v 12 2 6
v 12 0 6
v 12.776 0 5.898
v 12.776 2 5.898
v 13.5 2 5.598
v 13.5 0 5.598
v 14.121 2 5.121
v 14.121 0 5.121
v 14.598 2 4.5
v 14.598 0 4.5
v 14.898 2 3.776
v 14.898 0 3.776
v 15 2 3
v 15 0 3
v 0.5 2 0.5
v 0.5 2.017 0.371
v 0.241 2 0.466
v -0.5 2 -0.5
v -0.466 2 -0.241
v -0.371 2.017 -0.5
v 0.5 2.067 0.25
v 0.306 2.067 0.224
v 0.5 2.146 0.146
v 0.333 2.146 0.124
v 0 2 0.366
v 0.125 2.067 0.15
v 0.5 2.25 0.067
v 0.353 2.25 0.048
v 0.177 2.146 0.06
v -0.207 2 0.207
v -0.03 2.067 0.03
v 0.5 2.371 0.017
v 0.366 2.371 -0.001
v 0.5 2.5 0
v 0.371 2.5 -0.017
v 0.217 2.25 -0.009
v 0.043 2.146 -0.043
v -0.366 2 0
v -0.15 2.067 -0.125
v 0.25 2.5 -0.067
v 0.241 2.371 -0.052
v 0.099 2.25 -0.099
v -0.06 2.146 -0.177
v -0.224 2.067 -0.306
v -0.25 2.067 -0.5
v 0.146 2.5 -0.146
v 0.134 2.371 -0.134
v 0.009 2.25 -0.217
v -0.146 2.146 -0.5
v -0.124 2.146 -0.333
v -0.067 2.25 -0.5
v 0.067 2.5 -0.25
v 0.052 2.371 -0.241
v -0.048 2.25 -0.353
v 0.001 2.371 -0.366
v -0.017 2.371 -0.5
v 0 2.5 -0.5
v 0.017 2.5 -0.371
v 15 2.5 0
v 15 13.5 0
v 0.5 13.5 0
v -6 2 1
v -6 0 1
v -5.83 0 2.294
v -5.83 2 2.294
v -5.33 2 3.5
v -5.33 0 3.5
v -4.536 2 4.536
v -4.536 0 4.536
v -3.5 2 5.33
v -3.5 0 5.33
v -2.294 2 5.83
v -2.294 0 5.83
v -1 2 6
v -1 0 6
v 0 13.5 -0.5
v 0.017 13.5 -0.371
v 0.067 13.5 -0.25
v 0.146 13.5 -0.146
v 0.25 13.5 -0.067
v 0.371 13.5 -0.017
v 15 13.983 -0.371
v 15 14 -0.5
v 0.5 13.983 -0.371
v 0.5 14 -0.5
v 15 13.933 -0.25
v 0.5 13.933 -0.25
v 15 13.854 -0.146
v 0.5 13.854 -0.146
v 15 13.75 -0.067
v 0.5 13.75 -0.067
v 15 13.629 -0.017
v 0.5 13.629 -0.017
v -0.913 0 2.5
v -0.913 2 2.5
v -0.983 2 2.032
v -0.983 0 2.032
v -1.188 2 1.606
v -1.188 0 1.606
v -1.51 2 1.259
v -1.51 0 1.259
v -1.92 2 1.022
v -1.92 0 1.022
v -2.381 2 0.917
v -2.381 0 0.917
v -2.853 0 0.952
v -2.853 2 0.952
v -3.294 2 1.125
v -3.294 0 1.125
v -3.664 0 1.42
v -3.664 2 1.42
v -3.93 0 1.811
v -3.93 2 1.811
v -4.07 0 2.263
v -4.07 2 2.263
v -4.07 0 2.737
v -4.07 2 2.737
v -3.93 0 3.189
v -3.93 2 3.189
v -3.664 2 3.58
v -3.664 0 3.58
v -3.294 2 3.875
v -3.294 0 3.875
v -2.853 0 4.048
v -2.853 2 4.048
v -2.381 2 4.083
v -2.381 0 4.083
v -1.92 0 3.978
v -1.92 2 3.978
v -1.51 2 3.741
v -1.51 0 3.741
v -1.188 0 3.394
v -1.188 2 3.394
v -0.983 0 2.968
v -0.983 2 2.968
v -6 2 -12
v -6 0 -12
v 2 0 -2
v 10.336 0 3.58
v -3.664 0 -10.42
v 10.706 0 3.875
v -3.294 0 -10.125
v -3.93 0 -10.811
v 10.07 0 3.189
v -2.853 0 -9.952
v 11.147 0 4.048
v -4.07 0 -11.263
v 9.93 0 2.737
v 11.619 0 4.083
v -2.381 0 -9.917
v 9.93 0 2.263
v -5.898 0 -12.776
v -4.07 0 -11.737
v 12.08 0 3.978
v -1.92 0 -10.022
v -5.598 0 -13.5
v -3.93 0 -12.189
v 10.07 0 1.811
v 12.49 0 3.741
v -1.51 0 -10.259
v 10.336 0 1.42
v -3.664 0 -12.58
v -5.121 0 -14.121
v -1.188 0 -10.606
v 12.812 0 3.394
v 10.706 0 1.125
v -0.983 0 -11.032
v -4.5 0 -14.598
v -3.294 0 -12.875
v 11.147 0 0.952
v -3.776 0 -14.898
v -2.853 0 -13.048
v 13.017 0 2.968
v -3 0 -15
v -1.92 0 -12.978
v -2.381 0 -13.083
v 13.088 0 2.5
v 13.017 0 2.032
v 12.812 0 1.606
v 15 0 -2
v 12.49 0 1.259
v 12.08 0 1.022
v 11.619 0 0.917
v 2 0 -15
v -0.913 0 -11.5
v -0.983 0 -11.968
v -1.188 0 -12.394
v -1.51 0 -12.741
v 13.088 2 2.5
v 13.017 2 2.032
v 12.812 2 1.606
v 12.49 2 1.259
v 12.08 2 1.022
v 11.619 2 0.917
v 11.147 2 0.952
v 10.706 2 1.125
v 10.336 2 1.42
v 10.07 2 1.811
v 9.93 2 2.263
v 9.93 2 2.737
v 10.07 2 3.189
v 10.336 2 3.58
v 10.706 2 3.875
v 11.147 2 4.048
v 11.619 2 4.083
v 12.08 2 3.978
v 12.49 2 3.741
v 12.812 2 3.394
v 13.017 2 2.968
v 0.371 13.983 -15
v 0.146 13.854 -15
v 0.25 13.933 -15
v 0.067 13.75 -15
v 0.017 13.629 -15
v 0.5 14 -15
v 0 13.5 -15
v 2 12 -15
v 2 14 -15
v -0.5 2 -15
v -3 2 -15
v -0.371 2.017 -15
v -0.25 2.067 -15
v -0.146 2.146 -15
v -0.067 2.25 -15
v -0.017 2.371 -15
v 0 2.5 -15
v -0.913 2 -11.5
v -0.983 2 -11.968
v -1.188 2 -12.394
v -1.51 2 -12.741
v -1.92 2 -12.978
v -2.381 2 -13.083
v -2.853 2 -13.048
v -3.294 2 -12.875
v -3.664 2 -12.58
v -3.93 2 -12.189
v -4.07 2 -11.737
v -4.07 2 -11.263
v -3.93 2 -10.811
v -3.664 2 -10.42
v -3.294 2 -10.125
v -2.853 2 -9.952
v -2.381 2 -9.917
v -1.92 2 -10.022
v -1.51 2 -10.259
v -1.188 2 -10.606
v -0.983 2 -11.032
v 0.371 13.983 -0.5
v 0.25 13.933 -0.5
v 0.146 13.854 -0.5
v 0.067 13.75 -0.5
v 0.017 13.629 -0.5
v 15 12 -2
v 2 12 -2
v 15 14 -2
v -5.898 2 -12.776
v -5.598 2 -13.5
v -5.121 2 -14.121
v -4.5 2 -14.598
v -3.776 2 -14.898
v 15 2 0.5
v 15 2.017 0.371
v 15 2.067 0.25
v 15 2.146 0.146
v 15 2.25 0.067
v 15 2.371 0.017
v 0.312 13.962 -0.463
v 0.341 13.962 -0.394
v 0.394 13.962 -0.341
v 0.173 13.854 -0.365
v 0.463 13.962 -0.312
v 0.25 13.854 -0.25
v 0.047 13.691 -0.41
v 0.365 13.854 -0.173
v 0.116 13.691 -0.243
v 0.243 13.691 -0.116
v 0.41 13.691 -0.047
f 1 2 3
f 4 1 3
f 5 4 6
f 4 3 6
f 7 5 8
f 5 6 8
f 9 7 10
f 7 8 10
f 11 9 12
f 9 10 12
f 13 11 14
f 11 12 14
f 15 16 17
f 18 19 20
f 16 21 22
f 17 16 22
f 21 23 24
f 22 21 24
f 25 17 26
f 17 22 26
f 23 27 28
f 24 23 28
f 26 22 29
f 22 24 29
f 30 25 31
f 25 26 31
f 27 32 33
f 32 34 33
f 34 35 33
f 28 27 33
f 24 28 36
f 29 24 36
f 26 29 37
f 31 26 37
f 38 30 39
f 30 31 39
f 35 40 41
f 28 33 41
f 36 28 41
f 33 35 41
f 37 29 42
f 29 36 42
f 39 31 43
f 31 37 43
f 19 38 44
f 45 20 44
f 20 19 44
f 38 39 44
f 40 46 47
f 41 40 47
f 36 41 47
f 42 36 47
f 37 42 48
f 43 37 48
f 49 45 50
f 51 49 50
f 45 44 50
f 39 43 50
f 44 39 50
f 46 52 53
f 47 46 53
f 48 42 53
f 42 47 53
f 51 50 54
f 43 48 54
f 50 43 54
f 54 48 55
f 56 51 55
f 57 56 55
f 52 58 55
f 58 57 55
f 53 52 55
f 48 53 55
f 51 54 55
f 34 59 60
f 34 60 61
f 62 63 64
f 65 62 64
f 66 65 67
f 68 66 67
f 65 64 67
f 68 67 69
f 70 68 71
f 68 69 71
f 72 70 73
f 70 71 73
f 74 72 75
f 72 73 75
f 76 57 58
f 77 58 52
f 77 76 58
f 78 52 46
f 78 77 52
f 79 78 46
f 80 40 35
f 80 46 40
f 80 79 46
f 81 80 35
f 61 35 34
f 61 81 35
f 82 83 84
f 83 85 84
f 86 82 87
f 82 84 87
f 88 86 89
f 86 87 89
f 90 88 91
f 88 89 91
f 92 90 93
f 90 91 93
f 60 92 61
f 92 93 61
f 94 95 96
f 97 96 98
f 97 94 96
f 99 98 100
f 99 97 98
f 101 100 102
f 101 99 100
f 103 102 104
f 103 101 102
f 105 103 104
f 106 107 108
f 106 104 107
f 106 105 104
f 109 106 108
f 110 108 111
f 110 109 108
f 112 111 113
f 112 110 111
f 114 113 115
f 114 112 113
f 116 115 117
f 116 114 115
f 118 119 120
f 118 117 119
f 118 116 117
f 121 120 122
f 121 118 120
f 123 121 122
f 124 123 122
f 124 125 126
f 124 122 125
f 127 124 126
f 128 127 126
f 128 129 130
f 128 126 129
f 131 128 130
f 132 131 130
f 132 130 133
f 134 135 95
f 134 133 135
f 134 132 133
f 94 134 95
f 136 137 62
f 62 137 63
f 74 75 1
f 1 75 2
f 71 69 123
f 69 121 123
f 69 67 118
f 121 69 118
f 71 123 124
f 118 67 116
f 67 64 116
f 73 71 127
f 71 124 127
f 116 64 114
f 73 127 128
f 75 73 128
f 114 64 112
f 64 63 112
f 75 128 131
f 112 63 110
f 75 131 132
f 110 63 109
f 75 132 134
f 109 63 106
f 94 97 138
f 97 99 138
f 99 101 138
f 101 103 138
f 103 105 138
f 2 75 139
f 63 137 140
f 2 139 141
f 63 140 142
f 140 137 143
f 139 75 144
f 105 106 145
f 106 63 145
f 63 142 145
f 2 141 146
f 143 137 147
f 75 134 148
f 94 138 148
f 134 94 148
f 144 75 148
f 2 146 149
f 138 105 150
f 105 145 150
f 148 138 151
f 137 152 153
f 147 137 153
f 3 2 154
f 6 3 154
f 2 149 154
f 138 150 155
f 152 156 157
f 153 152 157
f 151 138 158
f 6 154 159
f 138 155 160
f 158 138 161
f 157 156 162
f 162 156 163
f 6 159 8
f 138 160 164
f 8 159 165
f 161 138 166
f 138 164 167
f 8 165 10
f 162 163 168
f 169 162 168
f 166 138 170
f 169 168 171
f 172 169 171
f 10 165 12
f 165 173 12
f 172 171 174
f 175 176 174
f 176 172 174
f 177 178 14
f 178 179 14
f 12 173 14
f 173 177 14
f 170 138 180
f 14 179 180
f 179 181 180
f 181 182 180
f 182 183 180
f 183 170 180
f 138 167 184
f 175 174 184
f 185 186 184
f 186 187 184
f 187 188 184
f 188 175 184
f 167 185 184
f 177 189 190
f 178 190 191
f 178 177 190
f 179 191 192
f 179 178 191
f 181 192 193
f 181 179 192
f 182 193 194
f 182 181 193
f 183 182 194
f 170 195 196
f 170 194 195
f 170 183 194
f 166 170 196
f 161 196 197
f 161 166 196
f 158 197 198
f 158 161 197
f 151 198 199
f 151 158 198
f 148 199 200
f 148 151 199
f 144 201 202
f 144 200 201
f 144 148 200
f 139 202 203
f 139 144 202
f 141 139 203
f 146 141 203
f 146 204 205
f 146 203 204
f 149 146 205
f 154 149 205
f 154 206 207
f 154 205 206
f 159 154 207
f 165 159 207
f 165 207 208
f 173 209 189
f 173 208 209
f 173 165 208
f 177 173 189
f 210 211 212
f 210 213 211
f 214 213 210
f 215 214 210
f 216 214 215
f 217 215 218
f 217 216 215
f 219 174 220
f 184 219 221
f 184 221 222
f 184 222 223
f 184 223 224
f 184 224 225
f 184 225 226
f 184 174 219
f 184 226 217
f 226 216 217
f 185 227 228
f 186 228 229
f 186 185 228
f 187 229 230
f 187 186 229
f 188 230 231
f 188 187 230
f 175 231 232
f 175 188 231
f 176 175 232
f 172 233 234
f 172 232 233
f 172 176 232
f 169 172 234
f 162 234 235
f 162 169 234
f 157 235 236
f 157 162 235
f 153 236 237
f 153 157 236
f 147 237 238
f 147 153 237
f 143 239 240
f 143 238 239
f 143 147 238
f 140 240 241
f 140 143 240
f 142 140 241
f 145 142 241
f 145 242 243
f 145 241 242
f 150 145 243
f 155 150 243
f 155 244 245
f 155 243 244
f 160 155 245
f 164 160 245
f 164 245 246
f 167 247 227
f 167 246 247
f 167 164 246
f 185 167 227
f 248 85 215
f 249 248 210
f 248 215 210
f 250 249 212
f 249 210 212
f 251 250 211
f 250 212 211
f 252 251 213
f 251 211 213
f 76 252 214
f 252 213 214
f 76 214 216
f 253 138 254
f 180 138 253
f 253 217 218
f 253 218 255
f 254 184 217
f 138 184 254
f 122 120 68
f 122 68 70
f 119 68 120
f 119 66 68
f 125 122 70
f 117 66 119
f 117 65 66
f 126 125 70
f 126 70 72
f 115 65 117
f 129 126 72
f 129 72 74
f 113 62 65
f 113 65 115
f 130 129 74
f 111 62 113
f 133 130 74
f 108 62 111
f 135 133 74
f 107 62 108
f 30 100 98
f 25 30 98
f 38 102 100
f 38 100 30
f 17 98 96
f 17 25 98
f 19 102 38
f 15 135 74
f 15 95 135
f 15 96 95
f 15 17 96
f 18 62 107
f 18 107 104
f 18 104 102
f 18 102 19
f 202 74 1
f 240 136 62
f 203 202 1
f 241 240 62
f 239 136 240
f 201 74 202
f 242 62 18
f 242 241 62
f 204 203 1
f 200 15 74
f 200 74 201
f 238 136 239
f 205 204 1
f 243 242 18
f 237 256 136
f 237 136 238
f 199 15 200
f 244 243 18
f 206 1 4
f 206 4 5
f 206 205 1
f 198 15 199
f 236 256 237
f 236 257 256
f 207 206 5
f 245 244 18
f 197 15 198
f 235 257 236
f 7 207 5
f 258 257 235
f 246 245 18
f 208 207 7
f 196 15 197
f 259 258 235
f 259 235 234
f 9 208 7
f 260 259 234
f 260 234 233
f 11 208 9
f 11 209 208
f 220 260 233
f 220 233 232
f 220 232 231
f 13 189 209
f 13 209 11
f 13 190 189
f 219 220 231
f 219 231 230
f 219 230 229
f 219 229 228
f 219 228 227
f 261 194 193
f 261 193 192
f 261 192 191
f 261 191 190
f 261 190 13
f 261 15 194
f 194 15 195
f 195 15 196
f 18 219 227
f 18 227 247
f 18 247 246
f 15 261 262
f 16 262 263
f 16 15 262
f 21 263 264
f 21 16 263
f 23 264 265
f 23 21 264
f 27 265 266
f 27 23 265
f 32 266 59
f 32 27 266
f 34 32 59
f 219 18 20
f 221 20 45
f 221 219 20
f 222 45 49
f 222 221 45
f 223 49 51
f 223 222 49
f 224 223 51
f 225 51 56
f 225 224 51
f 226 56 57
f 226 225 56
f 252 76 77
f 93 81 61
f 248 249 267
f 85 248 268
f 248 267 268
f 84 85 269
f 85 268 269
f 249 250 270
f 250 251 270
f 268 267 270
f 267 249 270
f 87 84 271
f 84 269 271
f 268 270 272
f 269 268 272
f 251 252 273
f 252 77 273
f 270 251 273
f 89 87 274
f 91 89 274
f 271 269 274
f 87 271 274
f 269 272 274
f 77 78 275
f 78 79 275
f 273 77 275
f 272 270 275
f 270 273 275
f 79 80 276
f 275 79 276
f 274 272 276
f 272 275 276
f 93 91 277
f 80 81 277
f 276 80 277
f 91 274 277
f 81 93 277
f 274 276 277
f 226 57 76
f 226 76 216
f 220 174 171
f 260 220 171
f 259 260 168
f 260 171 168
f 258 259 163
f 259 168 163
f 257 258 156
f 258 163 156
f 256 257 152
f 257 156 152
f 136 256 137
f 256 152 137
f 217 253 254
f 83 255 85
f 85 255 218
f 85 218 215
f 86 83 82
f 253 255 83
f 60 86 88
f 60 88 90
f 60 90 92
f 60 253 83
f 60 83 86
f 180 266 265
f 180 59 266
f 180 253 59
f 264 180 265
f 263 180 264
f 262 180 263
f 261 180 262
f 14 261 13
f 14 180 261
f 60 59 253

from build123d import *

# Parameters (mm, degrees)
BOSS_EXTRUDE1_DEPTH     = 12
BOSS_EXTRUDE2_DEPTH     = 2
BOSS_EXTRUDE3_DEPTH     = 2
CUT_EXTRUDE1_DEPTH      = 12
CUT_EXTRUDE1_DEPTH_BACK = 2
SKETCH3_R               = 1.5875
FILLET1_R               = 0.5


with BuildPart() as part:
    # Sketch1 → Boss-Extrude1 (new body)
    with BuildSketch(Plane(origin=(0, 0, 0), x_dir=(1, 0, 0), z_dir=(0, 1, 0))):
        Polygon((0, 15), (0, 0), (15, 0), (15, 2), (2, 2), (2, 15), align=None)
    extrude(amount=BOSS_EXTRUDE1_DEPTH)

    # Sketch1<3> → Boss-Extrude2 (add)
    with BuildSketch(Plane(origin=(0, 0, 0), x_dir=(1, 0, 0), z_dir=(0, 1, 0))):
        with BuildLine():
            Line((15, 0), (0, 0))
            Line((0, 0), (0, 15))
            Line((0, 15), (-3, 15))
            ThreePointArc((-3, 15), (-5.121320344, 14.121320344), (-6, 12))
            Line((-6, 12), (-6, -1))
            ThreePointArc((-6, -1), (-4.535533906, -4.535533906), (-1, -6))
            Line((-1, -6), (12, -6))
            ThreePointArc((12, -6), (14.121320344, -5.121320344), (15, -3))
            Line((15, -3), (15, 0))
        make_face()
    extrude(amount=BOSS_EXTRUDE2_DEPTH)

    # Sketch2 → Boss-Extrude3 (add)
    with BuildSketch(Plane(origin=(0, 12, 0), x_dir=(1, 0, 0), z_dir=(0, 1, 0))):
        Polygon((2, 15), (15, 2), (15, 0), (0, 0), (0, 15), align=None)
    extrude(amount=BOSS_EXTRUDE3_DEPTH)

    # Sketch3 → Cut-Extrude1 (cut, two sides: drawn at the far end of the back side and taken through both)
    with BuildSketch(Plane(origin=(0, 0, 0), x_dir=(1, 0, 0), z_dir=(0, 1, 0)).offset(-CUT_EXTRUDE1_DEPTH_BACK)):
        with Locations((-2.5, -2.5)):
            Circle(SKETCH3_R)
        with Locations((-2.5, 11.5)):
            Circle(SKETCH3_R)
        with Locations((11.5, -2.5)):
            Circle(SKETCH3_R)
    extrude(amount=CUT_EXTRUDE1_DEPTH + CUT_EXTRUDE1_DEPTH_BACK, mode=Mode.SUBTRACT)

    # Fillet1
    fillet1_edges = [part.edges().sort_by_distance(p)[0] for p in [
        (0, 2, -7.5),
        (7.5, 2, 0),
        (7.5, 14, 0),
        (0, 8, 0),
        (0, 14, -7.5),
    ]]
    fillet(fillet1_edges, radius=FILLET1_R)


solid = part.part
